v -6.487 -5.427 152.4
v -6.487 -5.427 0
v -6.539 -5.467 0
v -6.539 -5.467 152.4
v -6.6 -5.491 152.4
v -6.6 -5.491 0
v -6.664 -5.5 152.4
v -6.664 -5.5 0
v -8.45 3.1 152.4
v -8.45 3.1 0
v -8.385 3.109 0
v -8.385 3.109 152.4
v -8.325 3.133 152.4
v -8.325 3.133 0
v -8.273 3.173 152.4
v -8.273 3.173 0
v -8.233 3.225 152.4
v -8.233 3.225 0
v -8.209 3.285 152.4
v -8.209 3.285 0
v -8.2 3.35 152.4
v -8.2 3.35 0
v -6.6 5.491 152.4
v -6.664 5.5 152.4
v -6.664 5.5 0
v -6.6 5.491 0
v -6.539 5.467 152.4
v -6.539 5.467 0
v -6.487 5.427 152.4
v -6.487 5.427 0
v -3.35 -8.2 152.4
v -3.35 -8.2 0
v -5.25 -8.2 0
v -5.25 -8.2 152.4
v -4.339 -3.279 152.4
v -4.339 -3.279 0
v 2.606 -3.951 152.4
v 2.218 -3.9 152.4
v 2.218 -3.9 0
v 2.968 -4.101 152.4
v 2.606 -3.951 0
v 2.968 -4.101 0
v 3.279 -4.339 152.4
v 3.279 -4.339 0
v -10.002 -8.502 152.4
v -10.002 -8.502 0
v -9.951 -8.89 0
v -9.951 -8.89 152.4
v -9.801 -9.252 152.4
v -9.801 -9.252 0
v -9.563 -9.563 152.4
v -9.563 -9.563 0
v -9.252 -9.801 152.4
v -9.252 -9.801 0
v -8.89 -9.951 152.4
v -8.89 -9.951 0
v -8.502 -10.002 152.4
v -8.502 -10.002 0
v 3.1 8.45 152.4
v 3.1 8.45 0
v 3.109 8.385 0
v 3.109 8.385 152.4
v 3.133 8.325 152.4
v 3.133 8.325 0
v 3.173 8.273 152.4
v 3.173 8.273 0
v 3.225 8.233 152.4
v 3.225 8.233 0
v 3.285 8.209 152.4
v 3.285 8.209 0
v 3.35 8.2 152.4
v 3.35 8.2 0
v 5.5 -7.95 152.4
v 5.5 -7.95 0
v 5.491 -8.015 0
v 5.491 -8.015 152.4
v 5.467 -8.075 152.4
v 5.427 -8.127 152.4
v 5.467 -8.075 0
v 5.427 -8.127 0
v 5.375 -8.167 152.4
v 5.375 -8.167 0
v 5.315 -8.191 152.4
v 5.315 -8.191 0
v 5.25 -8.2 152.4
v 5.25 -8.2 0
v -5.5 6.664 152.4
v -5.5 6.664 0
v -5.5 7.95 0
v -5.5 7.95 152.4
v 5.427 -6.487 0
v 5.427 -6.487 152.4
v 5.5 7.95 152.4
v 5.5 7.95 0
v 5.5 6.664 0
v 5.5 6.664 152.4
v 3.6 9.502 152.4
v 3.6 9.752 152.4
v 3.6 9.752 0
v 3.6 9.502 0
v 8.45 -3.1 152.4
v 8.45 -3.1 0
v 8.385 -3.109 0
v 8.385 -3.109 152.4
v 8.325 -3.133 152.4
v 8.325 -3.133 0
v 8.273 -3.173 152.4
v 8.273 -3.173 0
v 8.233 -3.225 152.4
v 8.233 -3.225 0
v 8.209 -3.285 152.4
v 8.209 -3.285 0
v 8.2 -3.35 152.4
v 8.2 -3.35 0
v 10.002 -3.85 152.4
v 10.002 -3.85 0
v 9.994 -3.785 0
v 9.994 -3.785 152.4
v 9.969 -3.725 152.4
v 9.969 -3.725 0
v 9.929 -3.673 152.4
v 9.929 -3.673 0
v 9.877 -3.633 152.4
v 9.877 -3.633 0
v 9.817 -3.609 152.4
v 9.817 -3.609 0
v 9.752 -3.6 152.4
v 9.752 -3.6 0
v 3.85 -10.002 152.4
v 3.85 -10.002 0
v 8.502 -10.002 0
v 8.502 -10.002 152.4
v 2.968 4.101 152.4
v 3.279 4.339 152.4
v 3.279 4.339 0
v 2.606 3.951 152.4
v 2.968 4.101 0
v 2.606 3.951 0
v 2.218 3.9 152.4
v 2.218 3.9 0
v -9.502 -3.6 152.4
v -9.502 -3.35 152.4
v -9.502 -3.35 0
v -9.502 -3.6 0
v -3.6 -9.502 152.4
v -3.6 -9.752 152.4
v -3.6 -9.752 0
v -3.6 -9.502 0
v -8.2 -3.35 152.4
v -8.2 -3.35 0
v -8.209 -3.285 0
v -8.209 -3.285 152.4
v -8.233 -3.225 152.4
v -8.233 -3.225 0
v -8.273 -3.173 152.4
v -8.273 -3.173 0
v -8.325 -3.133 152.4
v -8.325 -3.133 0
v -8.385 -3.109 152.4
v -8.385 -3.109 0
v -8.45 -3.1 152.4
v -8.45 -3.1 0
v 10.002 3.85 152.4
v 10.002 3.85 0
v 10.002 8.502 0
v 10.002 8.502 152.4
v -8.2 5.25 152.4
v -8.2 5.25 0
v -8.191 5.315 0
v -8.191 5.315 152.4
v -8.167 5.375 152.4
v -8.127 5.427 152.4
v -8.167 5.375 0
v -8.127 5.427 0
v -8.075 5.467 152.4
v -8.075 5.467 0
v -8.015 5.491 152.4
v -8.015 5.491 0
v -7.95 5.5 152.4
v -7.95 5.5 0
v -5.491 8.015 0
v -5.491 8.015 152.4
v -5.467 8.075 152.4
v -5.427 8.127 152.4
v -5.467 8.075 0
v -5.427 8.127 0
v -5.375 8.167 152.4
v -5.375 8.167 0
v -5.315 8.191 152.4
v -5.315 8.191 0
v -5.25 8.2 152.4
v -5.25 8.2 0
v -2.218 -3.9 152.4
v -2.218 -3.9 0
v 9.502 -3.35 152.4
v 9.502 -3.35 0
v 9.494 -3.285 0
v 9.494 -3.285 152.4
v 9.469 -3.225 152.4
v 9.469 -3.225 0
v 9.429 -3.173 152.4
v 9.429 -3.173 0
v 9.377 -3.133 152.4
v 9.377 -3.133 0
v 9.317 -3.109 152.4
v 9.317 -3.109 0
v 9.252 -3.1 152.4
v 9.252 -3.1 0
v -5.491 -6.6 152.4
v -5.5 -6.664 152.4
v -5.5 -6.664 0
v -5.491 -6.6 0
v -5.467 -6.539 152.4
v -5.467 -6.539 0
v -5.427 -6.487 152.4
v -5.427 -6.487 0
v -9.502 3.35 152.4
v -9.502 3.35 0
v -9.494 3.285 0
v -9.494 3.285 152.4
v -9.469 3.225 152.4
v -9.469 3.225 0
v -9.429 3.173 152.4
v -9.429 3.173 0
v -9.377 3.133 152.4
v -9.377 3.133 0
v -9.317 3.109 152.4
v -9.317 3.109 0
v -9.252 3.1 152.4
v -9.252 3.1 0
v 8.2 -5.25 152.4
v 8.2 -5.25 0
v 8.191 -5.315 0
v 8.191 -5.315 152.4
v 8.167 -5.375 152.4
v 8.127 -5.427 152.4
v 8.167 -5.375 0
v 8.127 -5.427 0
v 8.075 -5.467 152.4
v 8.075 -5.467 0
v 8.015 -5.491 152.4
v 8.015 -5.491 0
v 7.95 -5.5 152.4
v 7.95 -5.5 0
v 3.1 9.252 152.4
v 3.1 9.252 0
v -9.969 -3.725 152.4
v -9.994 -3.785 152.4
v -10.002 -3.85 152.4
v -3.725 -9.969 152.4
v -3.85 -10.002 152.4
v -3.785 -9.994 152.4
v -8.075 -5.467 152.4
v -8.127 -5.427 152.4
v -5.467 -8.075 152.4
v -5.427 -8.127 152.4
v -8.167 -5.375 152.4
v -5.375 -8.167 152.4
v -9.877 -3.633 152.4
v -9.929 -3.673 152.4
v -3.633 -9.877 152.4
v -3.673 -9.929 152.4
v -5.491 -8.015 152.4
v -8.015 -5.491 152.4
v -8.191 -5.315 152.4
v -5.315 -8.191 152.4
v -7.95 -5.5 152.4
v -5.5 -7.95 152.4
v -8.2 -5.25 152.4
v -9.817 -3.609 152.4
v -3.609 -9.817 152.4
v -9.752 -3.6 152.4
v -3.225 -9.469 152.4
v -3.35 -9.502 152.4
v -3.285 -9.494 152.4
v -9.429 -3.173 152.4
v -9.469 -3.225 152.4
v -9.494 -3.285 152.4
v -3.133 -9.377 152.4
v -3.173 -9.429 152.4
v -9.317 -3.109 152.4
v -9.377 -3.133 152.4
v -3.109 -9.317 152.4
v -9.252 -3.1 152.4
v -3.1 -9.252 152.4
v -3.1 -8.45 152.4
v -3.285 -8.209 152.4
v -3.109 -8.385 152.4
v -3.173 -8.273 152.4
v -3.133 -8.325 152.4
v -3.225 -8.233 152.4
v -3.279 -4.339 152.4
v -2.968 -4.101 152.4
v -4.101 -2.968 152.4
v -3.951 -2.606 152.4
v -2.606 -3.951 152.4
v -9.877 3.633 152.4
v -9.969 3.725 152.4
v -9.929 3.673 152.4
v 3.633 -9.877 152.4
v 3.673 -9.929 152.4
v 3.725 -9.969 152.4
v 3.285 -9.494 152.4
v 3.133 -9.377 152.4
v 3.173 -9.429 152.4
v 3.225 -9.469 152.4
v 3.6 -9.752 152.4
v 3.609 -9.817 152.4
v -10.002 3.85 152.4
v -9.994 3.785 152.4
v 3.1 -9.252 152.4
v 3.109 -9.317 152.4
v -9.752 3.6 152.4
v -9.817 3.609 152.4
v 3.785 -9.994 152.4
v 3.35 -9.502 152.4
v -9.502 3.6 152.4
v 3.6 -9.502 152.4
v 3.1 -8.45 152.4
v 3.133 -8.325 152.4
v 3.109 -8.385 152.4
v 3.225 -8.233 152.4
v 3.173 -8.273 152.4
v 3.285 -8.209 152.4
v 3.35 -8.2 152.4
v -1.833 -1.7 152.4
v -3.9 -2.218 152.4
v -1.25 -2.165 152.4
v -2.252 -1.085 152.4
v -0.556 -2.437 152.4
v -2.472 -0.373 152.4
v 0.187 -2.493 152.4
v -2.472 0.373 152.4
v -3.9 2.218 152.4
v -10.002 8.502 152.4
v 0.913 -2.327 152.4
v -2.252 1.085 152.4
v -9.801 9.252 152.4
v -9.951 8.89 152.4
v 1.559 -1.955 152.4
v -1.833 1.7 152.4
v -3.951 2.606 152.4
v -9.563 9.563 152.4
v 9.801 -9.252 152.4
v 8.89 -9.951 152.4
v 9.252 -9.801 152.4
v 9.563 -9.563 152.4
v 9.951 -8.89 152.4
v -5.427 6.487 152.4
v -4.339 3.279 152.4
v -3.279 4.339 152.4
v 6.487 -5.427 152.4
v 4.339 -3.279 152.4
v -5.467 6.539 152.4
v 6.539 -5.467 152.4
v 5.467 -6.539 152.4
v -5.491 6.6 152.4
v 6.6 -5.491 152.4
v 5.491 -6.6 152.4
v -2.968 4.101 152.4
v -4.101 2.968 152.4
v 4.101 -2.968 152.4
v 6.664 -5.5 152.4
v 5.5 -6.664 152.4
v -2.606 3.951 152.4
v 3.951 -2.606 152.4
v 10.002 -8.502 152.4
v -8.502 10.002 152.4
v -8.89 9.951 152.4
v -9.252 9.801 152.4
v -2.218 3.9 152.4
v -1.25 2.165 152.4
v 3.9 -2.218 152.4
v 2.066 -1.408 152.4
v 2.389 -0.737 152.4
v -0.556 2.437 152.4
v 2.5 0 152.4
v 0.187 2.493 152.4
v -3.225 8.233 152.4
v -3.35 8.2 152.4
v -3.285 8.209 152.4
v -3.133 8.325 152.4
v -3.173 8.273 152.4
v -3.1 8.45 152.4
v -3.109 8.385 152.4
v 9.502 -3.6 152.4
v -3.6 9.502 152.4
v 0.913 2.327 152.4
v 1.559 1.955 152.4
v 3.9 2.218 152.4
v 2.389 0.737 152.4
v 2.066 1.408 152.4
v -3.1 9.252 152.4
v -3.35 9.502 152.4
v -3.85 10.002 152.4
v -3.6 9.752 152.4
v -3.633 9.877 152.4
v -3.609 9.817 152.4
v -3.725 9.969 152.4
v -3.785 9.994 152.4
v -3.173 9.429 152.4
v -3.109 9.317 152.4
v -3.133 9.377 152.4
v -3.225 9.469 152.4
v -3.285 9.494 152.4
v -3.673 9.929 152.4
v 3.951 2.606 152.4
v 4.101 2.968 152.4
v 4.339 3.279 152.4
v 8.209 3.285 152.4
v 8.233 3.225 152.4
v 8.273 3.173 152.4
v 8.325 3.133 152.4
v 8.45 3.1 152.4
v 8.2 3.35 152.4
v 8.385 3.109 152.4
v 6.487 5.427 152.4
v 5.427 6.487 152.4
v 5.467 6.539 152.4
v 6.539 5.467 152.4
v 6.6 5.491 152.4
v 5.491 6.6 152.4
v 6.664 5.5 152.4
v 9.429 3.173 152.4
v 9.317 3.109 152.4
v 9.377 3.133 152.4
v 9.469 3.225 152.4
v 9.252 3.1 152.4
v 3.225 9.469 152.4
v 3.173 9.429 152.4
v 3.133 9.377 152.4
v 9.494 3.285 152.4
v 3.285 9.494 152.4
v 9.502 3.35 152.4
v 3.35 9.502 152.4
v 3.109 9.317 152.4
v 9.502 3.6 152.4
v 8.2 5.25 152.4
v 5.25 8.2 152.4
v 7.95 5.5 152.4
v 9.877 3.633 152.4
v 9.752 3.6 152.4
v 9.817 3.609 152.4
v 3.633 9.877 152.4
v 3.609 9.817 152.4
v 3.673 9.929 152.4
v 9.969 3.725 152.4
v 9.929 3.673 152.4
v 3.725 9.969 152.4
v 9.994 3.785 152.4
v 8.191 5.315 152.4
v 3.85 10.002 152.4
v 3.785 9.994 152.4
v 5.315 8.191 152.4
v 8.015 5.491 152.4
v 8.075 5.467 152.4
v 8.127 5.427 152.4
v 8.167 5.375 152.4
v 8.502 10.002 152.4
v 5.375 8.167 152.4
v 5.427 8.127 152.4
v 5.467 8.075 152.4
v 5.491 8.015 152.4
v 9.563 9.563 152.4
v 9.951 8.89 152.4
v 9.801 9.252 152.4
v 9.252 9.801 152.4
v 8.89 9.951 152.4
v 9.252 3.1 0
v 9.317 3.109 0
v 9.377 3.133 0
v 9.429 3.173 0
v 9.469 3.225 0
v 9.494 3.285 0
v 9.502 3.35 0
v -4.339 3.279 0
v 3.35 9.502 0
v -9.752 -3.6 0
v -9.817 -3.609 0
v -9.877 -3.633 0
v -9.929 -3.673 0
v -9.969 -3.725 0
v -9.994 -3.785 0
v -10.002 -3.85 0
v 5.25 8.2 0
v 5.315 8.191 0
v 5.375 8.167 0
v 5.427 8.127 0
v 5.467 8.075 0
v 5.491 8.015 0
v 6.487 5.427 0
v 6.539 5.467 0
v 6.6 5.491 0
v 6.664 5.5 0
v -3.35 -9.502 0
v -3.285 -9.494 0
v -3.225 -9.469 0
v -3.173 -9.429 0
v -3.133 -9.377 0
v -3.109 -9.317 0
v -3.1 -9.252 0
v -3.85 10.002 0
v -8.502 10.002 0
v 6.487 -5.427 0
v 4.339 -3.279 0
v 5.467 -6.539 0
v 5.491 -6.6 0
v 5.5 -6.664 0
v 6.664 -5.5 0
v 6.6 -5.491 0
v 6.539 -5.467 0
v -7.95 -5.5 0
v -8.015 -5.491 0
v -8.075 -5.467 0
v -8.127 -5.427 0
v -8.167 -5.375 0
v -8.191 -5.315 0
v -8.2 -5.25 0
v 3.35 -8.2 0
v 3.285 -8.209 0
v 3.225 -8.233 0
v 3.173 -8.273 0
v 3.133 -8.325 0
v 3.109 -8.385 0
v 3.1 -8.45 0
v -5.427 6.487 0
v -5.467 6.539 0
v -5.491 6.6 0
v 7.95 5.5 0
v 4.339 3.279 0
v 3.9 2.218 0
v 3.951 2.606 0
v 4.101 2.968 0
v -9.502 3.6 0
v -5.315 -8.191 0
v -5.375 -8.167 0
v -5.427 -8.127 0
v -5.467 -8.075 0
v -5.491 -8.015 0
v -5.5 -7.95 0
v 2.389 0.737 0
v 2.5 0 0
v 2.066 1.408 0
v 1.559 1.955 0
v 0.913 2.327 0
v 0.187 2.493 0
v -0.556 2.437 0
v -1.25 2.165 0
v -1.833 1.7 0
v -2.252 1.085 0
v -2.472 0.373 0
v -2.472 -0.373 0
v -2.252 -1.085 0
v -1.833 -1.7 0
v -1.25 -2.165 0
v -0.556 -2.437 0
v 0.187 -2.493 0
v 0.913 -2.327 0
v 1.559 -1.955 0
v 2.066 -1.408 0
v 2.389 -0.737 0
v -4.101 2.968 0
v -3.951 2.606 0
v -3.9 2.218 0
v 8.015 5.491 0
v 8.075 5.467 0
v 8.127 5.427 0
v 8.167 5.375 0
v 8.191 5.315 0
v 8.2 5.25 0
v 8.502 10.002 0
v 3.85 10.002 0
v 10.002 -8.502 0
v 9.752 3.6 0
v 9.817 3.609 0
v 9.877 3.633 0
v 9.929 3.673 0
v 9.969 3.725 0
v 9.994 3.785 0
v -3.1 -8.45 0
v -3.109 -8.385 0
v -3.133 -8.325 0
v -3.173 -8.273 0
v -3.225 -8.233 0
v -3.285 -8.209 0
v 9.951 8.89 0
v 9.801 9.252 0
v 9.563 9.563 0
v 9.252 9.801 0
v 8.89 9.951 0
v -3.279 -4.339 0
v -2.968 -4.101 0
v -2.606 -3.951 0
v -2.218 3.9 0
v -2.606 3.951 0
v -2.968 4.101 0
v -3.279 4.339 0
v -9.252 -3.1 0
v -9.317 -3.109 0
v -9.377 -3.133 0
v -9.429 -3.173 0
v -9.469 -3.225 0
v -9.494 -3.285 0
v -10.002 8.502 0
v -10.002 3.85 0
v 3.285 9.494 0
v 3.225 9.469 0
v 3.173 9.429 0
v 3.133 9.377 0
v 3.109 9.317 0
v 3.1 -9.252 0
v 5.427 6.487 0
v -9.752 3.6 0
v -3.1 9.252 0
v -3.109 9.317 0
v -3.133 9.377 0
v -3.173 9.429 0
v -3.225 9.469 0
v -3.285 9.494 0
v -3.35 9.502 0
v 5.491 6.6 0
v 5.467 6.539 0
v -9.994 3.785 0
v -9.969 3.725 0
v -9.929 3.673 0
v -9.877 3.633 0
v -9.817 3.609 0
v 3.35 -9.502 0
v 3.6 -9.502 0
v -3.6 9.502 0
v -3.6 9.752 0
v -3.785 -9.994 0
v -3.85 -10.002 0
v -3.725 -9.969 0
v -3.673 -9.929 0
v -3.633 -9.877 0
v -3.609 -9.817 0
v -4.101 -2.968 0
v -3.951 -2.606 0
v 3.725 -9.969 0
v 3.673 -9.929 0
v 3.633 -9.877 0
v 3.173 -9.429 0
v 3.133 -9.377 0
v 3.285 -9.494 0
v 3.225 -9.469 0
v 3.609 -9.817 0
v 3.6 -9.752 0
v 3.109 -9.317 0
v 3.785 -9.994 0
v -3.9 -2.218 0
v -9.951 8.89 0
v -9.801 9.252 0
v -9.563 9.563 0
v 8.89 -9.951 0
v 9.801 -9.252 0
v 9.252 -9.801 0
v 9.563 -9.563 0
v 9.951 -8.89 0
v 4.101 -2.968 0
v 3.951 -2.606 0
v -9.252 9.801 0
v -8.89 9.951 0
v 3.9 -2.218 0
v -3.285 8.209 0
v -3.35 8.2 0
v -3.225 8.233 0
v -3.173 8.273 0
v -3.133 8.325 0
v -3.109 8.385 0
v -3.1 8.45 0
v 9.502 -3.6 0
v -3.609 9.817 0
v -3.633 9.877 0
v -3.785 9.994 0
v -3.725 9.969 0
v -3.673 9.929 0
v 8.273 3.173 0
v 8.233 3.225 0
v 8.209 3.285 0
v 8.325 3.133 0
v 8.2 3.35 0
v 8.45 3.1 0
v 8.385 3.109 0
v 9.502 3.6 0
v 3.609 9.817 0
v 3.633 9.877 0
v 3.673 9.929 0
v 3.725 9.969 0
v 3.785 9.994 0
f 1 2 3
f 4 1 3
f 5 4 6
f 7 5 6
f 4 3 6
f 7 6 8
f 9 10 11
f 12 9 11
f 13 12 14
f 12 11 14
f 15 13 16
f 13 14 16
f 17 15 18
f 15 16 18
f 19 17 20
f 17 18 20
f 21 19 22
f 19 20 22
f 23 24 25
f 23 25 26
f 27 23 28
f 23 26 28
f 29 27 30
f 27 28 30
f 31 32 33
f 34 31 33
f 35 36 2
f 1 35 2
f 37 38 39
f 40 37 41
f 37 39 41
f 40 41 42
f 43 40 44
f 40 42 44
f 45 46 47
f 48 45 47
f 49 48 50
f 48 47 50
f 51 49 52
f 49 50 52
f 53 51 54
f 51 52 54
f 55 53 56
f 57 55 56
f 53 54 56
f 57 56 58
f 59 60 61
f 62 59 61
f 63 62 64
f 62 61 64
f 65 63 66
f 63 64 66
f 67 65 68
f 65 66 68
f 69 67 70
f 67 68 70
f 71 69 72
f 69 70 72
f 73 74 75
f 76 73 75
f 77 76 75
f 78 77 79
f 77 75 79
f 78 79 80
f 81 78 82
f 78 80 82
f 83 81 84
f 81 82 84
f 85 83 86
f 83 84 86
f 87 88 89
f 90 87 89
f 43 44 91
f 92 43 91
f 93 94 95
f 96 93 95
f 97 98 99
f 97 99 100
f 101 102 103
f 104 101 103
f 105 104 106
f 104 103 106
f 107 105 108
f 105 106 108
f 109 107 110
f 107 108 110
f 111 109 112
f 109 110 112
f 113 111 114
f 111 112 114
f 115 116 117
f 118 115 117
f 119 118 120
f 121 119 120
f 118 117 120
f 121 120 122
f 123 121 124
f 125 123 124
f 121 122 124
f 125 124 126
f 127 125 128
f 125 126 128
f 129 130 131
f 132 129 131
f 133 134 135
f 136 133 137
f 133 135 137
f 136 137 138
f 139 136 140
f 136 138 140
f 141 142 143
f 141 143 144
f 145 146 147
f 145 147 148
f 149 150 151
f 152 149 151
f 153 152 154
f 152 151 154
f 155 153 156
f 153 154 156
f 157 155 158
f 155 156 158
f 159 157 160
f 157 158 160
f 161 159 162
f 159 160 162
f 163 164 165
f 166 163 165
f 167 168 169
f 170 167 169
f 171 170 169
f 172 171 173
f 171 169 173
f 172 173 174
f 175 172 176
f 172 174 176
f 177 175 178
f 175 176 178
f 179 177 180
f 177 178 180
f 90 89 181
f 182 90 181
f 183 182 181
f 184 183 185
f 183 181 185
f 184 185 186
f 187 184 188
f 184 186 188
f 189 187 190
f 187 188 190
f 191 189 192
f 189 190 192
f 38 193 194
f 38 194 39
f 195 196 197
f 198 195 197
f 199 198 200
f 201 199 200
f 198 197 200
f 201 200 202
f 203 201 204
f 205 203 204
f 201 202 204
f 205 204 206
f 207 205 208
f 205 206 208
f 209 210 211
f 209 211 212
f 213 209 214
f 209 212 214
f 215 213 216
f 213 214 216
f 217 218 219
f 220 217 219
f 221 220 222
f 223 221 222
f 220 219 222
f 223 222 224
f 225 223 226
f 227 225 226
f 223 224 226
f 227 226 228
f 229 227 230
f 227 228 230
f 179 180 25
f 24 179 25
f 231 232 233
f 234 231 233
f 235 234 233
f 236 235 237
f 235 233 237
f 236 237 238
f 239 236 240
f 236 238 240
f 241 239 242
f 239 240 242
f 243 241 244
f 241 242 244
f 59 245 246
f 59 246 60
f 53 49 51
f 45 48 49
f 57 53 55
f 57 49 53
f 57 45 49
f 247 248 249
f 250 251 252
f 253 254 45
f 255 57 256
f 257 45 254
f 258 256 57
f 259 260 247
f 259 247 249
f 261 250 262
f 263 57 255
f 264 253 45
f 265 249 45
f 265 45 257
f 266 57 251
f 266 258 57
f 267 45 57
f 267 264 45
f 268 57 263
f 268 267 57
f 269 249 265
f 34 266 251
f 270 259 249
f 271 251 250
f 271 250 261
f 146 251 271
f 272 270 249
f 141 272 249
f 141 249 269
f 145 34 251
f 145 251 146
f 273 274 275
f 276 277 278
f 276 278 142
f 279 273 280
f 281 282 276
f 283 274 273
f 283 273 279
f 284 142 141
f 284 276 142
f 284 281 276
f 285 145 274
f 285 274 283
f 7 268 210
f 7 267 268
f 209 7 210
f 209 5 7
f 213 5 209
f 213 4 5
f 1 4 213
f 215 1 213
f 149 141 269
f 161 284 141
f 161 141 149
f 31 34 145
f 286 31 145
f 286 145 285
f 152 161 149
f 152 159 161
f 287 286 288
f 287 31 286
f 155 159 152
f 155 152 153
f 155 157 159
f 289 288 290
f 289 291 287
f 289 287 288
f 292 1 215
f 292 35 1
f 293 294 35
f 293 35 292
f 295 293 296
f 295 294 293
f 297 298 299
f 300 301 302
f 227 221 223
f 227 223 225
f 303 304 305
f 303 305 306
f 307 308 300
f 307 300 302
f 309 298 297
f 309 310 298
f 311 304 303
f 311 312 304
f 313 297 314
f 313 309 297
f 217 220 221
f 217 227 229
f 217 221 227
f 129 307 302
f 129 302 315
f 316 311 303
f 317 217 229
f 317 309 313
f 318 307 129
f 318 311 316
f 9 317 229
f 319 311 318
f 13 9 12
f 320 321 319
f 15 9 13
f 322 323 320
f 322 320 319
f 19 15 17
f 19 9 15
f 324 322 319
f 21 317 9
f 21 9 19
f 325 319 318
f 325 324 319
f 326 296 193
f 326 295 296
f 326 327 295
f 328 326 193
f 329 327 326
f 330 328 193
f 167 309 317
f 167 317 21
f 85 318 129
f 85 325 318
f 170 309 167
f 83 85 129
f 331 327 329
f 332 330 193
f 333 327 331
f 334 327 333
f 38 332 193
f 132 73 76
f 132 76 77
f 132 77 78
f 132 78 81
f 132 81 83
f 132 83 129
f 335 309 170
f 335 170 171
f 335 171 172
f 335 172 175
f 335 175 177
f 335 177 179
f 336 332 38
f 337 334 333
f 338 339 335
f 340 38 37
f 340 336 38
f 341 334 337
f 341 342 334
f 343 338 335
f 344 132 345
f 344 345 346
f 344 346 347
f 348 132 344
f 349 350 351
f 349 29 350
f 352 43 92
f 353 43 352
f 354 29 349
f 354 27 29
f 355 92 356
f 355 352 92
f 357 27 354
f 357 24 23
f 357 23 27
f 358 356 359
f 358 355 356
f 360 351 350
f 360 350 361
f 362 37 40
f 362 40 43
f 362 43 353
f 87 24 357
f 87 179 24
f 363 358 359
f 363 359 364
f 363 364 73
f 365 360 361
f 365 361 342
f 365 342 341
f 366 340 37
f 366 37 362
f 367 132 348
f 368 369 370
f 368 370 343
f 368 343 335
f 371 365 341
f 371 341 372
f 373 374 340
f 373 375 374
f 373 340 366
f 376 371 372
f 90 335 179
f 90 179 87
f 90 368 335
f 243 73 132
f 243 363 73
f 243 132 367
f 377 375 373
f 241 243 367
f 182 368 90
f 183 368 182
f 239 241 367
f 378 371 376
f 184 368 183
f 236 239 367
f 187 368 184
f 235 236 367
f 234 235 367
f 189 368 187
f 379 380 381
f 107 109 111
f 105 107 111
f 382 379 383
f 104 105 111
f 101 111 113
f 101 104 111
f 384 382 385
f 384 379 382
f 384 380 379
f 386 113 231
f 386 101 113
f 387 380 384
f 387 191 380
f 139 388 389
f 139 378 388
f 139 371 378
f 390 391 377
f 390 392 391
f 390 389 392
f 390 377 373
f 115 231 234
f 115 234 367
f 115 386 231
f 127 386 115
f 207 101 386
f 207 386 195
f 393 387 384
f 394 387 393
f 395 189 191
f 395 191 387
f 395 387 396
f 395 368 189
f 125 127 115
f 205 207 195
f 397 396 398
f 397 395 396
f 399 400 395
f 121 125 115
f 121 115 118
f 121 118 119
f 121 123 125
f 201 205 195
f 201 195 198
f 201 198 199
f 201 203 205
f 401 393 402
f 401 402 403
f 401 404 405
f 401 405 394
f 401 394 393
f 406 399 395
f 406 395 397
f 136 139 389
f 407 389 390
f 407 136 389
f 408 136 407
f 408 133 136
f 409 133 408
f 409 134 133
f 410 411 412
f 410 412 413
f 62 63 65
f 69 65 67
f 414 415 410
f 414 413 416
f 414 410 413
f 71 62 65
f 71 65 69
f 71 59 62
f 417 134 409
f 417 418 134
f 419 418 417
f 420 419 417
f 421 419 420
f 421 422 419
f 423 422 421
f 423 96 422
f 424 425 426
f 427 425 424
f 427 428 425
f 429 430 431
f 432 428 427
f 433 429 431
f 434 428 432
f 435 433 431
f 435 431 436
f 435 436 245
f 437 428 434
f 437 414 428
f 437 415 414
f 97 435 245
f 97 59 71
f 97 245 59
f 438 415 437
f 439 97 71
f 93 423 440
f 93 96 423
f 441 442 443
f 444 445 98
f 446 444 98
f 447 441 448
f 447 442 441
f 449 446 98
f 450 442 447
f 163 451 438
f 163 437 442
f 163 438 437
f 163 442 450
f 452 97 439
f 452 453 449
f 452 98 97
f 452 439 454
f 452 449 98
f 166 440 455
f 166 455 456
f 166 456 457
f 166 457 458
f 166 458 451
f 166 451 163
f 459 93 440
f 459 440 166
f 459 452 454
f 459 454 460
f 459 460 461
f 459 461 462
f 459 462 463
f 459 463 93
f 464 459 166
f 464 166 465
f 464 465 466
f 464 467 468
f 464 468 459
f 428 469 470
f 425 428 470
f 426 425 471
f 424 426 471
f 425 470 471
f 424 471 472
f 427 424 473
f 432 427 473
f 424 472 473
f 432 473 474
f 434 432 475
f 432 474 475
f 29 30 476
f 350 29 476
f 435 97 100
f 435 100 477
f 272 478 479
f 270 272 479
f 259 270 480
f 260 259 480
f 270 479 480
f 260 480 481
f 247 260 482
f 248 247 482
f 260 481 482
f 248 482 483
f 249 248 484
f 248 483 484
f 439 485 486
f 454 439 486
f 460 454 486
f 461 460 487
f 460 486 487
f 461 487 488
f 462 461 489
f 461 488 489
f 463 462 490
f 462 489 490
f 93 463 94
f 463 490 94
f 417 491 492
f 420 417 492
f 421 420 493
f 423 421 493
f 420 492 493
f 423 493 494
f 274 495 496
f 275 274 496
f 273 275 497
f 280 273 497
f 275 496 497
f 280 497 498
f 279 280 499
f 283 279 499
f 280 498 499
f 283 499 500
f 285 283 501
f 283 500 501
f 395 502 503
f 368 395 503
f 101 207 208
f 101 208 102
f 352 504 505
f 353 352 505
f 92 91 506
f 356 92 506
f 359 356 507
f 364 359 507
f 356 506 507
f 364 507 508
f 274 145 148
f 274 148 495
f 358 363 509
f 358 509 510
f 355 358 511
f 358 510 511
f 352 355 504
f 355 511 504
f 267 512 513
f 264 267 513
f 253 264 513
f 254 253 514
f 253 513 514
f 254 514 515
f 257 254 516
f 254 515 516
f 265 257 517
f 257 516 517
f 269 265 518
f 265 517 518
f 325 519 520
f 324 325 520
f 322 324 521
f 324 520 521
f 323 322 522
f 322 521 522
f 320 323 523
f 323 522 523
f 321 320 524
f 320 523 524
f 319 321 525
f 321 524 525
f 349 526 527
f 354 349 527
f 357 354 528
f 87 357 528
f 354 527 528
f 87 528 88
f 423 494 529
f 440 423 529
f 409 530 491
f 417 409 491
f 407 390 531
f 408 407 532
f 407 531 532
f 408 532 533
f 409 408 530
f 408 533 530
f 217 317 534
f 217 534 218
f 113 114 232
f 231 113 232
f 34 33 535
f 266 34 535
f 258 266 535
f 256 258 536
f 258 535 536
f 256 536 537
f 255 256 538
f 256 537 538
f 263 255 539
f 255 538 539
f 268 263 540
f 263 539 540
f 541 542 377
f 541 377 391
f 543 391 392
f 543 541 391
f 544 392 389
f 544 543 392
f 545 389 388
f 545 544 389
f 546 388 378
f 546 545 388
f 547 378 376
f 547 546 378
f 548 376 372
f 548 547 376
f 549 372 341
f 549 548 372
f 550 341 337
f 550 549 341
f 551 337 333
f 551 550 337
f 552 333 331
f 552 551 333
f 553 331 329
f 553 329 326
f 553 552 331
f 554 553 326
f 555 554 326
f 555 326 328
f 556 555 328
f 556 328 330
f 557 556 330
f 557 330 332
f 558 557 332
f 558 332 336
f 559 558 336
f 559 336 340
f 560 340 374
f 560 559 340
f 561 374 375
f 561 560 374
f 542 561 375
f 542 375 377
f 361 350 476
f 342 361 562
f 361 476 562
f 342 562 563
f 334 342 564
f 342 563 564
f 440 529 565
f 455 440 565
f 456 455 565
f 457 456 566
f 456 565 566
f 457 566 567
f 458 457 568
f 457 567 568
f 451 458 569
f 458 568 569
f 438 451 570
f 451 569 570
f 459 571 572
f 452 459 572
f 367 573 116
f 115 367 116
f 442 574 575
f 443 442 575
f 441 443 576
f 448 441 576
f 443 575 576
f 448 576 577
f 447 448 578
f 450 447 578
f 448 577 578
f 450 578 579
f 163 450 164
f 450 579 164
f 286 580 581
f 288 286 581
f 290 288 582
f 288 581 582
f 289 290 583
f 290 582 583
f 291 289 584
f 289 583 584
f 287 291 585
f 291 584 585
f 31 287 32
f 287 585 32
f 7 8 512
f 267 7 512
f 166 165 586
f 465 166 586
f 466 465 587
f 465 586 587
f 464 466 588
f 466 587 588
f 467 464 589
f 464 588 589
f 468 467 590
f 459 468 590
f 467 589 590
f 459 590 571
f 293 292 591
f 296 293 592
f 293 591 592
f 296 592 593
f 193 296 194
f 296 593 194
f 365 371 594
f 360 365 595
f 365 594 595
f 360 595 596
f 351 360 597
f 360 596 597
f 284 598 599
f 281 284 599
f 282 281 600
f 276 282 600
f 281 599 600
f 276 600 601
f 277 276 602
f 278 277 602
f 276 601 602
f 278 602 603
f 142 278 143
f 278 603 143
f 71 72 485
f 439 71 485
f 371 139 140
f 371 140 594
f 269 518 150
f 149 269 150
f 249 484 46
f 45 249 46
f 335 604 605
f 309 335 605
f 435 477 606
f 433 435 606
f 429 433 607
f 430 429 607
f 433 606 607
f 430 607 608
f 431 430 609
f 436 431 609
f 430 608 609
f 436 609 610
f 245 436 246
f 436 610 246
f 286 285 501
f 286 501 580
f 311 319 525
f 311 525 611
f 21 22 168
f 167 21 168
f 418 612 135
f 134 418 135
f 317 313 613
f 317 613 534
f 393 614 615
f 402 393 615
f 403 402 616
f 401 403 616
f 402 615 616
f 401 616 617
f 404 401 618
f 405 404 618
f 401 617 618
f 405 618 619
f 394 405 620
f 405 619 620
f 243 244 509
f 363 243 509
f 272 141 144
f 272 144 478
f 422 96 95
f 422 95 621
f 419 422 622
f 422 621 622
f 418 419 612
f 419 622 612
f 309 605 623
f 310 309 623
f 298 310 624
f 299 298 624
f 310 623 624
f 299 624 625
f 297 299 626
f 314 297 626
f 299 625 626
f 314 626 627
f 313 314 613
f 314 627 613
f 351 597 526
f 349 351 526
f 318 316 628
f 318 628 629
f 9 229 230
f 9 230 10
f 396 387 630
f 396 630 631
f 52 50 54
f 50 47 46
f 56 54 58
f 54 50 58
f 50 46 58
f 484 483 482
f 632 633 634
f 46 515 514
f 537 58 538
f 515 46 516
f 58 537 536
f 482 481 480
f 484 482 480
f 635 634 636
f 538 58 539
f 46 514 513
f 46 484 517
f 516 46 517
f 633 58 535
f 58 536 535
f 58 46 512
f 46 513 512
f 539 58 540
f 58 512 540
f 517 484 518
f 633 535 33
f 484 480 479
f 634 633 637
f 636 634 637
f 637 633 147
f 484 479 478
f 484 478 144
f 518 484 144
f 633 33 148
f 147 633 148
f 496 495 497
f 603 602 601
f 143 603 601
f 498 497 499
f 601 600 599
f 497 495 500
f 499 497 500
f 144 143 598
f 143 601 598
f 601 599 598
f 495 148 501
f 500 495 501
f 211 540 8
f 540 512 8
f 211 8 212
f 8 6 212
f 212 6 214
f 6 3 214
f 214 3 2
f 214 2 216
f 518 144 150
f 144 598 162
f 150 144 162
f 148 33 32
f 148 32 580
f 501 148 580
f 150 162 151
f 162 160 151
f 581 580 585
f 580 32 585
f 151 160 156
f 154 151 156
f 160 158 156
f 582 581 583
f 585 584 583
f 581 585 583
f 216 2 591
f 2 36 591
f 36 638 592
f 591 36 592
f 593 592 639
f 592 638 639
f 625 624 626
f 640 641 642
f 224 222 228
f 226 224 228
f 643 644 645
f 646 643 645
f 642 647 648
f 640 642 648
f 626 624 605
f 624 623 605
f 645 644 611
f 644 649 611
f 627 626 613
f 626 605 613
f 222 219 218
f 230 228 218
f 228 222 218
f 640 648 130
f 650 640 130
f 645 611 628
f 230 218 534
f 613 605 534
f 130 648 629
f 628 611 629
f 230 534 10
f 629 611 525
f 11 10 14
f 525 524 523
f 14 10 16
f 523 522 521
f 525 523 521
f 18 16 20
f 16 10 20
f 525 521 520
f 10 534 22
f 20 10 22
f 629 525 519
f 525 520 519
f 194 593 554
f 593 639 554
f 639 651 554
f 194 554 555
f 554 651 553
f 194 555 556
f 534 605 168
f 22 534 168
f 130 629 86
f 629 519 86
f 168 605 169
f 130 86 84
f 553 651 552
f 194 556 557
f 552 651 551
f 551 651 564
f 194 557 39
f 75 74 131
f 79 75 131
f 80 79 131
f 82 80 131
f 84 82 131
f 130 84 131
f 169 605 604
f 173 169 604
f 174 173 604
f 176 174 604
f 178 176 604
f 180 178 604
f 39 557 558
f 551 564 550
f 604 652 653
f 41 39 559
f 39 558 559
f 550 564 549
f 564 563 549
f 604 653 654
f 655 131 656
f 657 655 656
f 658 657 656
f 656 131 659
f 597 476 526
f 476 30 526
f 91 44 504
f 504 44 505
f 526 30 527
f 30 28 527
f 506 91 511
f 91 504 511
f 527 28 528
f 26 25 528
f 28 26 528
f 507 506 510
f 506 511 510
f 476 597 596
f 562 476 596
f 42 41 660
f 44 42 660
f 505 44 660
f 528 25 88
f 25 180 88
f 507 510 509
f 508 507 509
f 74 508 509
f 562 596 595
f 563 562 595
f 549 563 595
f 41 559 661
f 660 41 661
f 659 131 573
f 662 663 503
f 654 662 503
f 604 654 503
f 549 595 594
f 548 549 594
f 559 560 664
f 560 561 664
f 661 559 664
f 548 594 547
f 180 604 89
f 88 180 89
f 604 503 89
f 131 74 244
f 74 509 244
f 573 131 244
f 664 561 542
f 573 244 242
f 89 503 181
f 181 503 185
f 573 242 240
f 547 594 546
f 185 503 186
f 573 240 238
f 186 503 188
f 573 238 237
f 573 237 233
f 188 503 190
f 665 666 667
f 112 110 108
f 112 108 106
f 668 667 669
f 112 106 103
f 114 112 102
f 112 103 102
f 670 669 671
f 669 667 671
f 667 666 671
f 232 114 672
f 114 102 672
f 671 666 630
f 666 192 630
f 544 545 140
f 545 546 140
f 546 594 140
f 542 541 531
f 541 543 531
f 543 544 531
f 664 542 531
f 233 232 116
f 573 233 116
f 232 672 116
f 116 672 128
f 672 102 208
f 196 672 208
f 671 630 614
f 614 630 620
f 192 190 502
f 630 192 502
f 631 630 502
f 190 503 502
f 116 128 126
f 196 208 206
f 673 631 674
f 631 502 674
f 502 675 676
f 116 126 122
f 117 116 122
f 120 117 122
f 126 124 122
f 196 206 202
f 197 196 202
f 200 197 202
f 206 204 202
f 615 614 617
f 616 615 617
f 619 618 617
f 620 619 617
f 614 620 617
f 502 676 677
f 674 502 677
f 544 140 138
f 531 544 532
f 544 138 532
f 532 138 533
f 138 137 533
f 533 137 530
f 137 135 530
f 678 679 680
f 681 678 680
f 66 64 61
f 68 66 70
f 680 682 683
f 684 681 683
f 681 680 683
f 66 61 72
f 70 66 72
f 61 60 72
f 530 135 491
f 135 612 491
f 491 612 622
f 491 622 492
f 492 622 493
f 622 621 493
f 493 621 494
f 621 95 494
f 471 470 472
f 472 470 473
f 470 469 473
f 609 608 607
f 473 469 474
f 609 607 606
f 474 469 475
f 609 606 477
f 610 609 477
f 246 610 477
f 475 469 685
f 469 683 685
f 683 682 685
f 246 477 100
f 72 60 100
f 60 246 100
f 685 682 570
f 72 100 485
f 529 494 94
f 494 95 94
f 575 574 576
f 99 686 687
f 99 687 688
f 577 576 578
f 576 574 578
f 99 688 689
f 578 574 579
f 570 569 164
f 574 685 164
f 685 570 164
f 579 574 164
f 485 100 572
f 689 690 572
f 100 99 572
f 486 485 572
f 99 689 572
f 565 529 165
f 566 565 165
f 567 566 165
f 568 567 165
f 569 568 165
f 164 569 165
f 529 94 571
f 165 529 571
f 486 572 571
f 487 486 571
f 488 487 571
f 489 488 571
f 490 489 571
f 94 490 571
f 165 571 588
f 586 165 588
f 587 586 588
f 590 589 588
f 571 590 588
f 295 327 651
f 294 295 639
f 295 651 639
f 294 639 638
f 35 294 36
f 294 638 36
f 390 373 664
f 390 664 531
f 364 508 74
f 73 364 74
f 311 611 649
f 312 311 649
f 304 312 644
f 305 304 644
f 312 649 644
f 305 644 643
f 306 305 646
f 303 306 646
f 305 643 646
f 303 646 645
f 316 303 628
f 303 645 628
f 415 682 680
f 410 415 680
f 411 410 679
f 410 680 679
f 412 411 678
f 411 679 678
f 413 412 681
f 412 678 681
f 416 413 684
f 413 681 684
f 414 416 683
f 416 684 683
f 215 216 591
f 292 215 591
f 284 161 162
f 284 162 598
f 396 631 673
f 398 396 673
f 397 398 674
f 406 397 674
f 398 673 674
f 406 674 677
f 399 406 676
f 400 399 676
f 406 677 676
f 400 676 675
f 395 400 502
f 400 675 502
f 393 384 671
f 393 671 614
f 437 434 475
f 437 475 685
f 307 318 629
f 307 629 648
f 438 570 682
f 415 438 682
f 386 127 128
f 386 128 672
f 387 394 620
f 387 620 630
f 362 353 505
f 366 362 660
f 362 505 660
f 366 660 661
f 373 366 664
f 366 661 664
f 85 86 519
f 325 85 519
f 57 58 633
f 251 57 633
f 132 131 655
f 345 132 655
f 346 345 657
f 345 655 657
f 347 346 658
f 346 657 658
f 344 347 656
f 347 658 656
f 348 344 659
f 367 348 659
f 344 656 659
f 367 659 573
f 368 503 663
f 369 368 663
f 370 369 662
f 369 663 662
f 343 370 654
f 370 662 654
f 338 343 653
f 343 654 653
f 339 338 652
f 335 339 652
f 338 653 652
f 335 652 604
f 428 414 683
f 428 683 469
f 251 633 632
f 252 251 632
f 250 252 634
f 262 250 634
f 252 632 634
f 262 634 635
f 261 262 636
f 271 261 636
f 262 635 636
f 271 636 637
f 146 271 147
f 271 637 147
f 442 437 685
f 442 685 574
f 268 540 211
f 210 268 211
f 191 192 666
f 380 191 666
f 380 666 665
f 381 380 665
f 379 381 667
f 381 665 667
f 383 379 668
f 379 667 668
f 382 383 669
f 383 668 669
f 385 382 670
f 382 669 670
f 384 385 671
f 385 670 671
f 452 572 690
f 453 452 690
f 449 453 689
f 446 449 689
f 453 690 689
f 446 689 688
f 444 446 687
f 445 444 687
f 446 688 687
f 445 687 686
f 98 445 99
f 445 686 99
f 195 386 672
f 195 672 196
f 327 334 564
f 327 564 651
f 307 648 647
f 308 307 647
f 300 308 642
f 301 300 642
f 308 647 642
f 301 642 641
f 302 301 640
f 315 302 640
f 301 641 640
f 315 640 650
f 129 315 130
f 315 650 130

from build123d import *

# Parameters (mm, degrees)
SKETCH_1_R      = 2.5
EXTRUDE_1_DEPTH = 152.4


with BuildPart() as part:
    # 草图1 → 凸台-拉伸1 (new body)
    with BuildSketch(Plane.XY):
        with BuildLine():
            Line((-8.502261885, -10.002261885), (-3.85, -10.002261885))
            ThreePointArc((-3.85, -10.002261885), (-3.673223305, -9.929038581), (-3.6, -9.752261885))
            Line((-3.6, -9.752261885), (-3.6, -9.502261885))
            Line((-3.6, -9.502261885), (-3.35, -9.502261885))
            ThreePointArc((-3.35, -9.502261885), (-3.173223305, -9.429038581), (-3.1, -9.252261885))
            Line((-3.1, -9.252261885), (-3.1, -8.45))
            ThreePointArc((-3.1, -8.45), (-3.173223305, -8.273223305), (-3.35, -8.2))
            Line((-3.35, -8.2), (-5.25, -8.2))
            ThreePointArc((-5.25, -8.2), (-5.426776695, -8.126776695), (-5.5, -7.95))
            Line((-5.5, -7.95), (-5.5, -6.664213562))
            ThreePointArc((-5.5, -6.664213562), (-5.480969883, -6.568542704), (-5.426776695, -6.487436867))
            Line((-5.426776695, -6.487436867), (-3.278679656, -4.339339828))
            ThreePointArc((-3.278679656, -4.339339828), (-2.792044633, -4.014180701), (-2.218019485, -3.9))
            Line((-2.218019485, -3.9), (2.218019485, -3.9))
            ThreePointArc((2.218019485, -3.9), (2.792044633, -4.014180701), (3.278679656, -4.339339828))
            Line((3.278679656, -4.339339828), (5.426776695, -6.487436867))
            ThreePointArc((5.426776695, -6.487436867), (5.480969883, -6.568542704), (5.5, -6.664213562))
            Line((5.5, -6.664213562), (5.5, -7.95))
            ThreePointArc((5.5, -7.95), (5.426776695, -8.126776695), (5.25, -8.2))
            Line((5.25, -8.2), (3.35, -8.2))
            ThreePointArc((3.35, -8.2), (3.173223305, -8.273223305), (3.1, -8.45))
            Line((3.1, -8.45), (3.1, -9.252261885))
            ThreePointArc((3.1, -9.252261885), (3.173223305, -9.429038581), (3.35, -9.502261885))
            Line((3.35, -9.502261885), (3.6, -9.502261885))
            Line((3.6, -9.502261885), (3.6, -9.752261885))
            ThreePointArc((3.6, -9.752261885), (3.673223305, -9.929038581), (3.85, -10.002261885))
            Line((3.85, -10.002261885), (8.502261885, -10.002261885))
            ThreePointArc((8.502261885, -10.002261885), (9.562922057, -9.562922057), (10.002261885, -8.502261885))
            Line((10.002261885, -8.502261885), (10.002261885, -3.85))
            ThreePointArc((10.002261885, -3.85), (9.929038581, -3.673223305), (9.752261885, -3.6))
            Line((9.752261885, -3.6), (9.502261885, -3.6))
            Line((9.502261885, -3.6), (9.502261885, -3.35))
            ThreePointArc((9.502261885, -3.35), (9.429038581, -3.173223305), (9.252261885, -3.1))
            Line((9.252261885, -3.1), (8.45, -3.1))
            ThreePointArc((8.45, -3.1), (8.273223305, -3.173223305), (8.2, -3.35))
            Line((8.2, -3.35), (8.2, -5.25))
            ThreePointArc((8.2, -5.25), (8.126776695, -5.426776695), (7.95, -5.5))
            Line((7.95, -5.5), (6.664213562, -5.5))
            ThreePointArc((6.664213562, -5.5), (6.568542704, -5.480969883), (6.487436867, -5.426776695))
            Line((6.487436867, -5.426776695), (4.339339828, -3.278679656))
            ThreePointArc((4.339339828, -3.278679656), (4.014180701, -2.792044633), (3.9, -2.218019485))
            Line((3.9, -2.218019485), (3.9, 2.218019485))
            ThreePointArc((3.9, 2.218019485), (4.014180701, 2.792044633), (4.339339828, 3.278679656))
            Line((4.339339828, 3.278679656), (6.487436867, 5.426776695))
            ThreePointArc((6.487436867, 5.426776695), (6.568542704, 5.480969883), (6.664213562, 5.5))
            Line((6.664213562, 5.5), (7.95, 5.5))
            ThreePointArc((7.95, 5.5), (8.126776695, 5.426776695), (8.2, 5.25))
            Line((8.2, 5.25), (8.2, 3.35))
            ThreePointArc((8.2, 3.35), (8.273223305, 3.173223305), (8.45, 3.1))
            Line((8.45, 3.1), (9.252261885, 3.1))
            ThreePointArc((9.252261885, 3.1), (9.429038581, 3.173223305), (9.502261885, 3.35))
            Line((9.502261885, 3.35), (9.502261885, 3.6))
            Line((9.502261885, 3.6), (9.752261885, 3.6))
            ThreePointArc((9.752261885, 3.6), (9.929038581, 3.673223305), (10.002261885, 3.85))
            Line((10.002261885, 3.85), (10.002261885, 8.502261885))
            ThreePointArc((10.002261885, 8.502261885), (9.562922057, 9.562922057), (8.502261885, 10.002261885))
            Line((8.502261885, 10.002261885), (3.85, 10.002261885))
            ThreePointArc((3.85, 10.002261885), (3.673223305, 9.929038581), (3.6, 9.752261885))
            Line((3.6, 9.752261885), (3.6, 9.502261885))
            Line((3.6, 9.502261885), (3.35, 9.502261885))
            ThreePointArc((3.35, 9.502261885), (3.173223305, 9.429038581), (3.1, 9.252261885))
            Line((3.1, 9.252261885), (3.1, 8.45))
            ThreePointArc((3.1, 8.45), (3.173223305, 8.273223305), (3.35, 8.2))
            Line((3.35, 8.2), (5.25, 8.2))
            ThreePointArc((5.25, 8.2), (5.426776695, 8.126776695), (5.5, 7.95))
            Line((5.5, 7.95), (5.5, 6.664213562))
            ThreePointArc((5.5, 6.664213562), (5.480969883, 6.568542704), (5.426776695, 6.487436867))
            Line((5.426776695, 6.487436867), (3.278679656, 4.339339828))
            ThreePointArc((3.278679656, 4.339339828), (2.792044633, 4.014180701), (2.218019485, 3.9))
            Line((2.218019485, 3.9), (-2.218019485, 3.9))
            ThreePointArc((-2.218019485, 3.9), (-2.792044633, 4.014180701), (-3.278679656, 4.339339828))
            Line((-3.278679656, 4.339339828), (-5.426776695, 6.487436867))
            ThreePointArc((-5.426776695, 6.487436867), (-5.480969883, 6.568542704), (-5.5, 6.664213562))
            Line((-5.5, 6.664213562), (-5.5, 7.95))
            ThreePointArc((-5.5, 7.95), (-5.426776695, 8.126776695), (-5.25, 8.2))
            Line((-5.25, 8.2), (-3.35, 8.2))
            ThreePointArc((-3.35, 8.2), (-3.173223305, 8.273223305), (-3.1, 8.45))
            Line((-3.1, 8.45), (-3.1, 9.252261885))
            ThreePointArc((-3.1, 9.252261885), (-3.173223305, 9.429038581), (-3.35, 9.502261885))
            Line((-3.35, 9.502261885), (-3.6, 9.502261885))
            Line((-3.6, 9.502261885), (-3.6, 9.752261885))
            ThreePointArc((-3.6, 9.752261885), (-3.673223305, 9.929038581), (-3.85, 10.002261885))
            Line((-3.85, 10.002261885), (-8.502261885, 10.002261885))
            ThreePointArc((-8.502261885, 10.002261885), (-9.562922057, 9.562922057), (-10.002261885, 8.502261885))
            Line((-10.002261885, 8.502261885), (-10.002261885, 3.85))
            ThreePointArc((-10.002261885, 3.85), (-9.929038581, 3.673223305), (-9.752261885, 3.6))
            Line((-9.752261885, 3.6), (-9.502261885, 3.6))
            Line((-9.502261885, 3.6), (-9.502261885, 3.35))
            ThreePointArc((-9.502261885, 3.35), (-9.429038581, 3.173223305), (-9.252261885, 3.1))
            Line((-9.252261885, 3.1), (-8.45, 3.1))
            ThreePointArc((-8.45, 3.1), (-8.273223305, 3.173223305), (-8.2, 3.35))
            Line((-8.2, 3.35), (-8.2, 5.25))
            ThreePointArc((-8.2, 5.25), (-8.126776695, 5.426776695), (-7.95, 5.5))
            Line((-7.95, 5.5), (-6.664213562, 5.5))
            ThreePointArc((-6.664213562, 5.5), (-6.568542704, 5.480969883), (-6.487436867, 5.426776695))
            Line((-6.487436867, 5.426776695), (-4.339339828, 3.278679656))
            ThreePointArc((-4.339339828, 3.278679656), (-4.014180701, 2.792044633), (-3.9, 2.218019485))
            Line((-3.9, 2.218019485), (-3.9, -2.218019485))
            ThreePointArc((-3.9, -2.218019485), (-4.014180701, -2.792044633), (-4.339339828, -3.278679656))
            Line((-4.339339828, -3.278679656), (-6.487436867, -5.426776695))
            ThreePointArc((-6.487436867, -5.426776695), (-6.568542704, -5.480969883), (-6.664213562, -5.5))
            Line((-6.664213562, -5.5), (-7.95, -5.5))
            ThreePointArc((-7.95, -5.5), (-8.126776695, -5.426776695), (-8.2, -5.25))
            Line((-8.2, -5.25), (-8.2, -3.35))
            ThreePointArc((-8.2, -3.35), (-8.273223305, -3.173223305), (-8.45, -3.1))
            Line((-8.45, -3.1), (-9.252261885, -3.1))
            ThreePointArc((-9.252261885, -3.1), (-9.429038581, -3.173223305), (-9.502261885, -3.35))
            Line((-9.502261885, -3.35), (-9.502261885, -3.6))
            Line((-9.502261885, -3.6), (-9.752261885, -3.6))
            ThreePointArc((-9.752261885, -3.6), (-9.929038581, -3.673223305), (-10.002261885, -3.85))
            Line((-10.002261885, -3.85), (-10.002261885, -8.502261885))
            ThreePointArc((-10.002261885, -8.502261885), (-9.562922057, -9.562922057), (-8.502261885, -10.002261885))
        make_face()
        Circle(SKETCH_1_R, mode=Mode.SUBTRACT)
    extrude(amount=EXTRUDE_1_DEPTH)


solid = part.part
